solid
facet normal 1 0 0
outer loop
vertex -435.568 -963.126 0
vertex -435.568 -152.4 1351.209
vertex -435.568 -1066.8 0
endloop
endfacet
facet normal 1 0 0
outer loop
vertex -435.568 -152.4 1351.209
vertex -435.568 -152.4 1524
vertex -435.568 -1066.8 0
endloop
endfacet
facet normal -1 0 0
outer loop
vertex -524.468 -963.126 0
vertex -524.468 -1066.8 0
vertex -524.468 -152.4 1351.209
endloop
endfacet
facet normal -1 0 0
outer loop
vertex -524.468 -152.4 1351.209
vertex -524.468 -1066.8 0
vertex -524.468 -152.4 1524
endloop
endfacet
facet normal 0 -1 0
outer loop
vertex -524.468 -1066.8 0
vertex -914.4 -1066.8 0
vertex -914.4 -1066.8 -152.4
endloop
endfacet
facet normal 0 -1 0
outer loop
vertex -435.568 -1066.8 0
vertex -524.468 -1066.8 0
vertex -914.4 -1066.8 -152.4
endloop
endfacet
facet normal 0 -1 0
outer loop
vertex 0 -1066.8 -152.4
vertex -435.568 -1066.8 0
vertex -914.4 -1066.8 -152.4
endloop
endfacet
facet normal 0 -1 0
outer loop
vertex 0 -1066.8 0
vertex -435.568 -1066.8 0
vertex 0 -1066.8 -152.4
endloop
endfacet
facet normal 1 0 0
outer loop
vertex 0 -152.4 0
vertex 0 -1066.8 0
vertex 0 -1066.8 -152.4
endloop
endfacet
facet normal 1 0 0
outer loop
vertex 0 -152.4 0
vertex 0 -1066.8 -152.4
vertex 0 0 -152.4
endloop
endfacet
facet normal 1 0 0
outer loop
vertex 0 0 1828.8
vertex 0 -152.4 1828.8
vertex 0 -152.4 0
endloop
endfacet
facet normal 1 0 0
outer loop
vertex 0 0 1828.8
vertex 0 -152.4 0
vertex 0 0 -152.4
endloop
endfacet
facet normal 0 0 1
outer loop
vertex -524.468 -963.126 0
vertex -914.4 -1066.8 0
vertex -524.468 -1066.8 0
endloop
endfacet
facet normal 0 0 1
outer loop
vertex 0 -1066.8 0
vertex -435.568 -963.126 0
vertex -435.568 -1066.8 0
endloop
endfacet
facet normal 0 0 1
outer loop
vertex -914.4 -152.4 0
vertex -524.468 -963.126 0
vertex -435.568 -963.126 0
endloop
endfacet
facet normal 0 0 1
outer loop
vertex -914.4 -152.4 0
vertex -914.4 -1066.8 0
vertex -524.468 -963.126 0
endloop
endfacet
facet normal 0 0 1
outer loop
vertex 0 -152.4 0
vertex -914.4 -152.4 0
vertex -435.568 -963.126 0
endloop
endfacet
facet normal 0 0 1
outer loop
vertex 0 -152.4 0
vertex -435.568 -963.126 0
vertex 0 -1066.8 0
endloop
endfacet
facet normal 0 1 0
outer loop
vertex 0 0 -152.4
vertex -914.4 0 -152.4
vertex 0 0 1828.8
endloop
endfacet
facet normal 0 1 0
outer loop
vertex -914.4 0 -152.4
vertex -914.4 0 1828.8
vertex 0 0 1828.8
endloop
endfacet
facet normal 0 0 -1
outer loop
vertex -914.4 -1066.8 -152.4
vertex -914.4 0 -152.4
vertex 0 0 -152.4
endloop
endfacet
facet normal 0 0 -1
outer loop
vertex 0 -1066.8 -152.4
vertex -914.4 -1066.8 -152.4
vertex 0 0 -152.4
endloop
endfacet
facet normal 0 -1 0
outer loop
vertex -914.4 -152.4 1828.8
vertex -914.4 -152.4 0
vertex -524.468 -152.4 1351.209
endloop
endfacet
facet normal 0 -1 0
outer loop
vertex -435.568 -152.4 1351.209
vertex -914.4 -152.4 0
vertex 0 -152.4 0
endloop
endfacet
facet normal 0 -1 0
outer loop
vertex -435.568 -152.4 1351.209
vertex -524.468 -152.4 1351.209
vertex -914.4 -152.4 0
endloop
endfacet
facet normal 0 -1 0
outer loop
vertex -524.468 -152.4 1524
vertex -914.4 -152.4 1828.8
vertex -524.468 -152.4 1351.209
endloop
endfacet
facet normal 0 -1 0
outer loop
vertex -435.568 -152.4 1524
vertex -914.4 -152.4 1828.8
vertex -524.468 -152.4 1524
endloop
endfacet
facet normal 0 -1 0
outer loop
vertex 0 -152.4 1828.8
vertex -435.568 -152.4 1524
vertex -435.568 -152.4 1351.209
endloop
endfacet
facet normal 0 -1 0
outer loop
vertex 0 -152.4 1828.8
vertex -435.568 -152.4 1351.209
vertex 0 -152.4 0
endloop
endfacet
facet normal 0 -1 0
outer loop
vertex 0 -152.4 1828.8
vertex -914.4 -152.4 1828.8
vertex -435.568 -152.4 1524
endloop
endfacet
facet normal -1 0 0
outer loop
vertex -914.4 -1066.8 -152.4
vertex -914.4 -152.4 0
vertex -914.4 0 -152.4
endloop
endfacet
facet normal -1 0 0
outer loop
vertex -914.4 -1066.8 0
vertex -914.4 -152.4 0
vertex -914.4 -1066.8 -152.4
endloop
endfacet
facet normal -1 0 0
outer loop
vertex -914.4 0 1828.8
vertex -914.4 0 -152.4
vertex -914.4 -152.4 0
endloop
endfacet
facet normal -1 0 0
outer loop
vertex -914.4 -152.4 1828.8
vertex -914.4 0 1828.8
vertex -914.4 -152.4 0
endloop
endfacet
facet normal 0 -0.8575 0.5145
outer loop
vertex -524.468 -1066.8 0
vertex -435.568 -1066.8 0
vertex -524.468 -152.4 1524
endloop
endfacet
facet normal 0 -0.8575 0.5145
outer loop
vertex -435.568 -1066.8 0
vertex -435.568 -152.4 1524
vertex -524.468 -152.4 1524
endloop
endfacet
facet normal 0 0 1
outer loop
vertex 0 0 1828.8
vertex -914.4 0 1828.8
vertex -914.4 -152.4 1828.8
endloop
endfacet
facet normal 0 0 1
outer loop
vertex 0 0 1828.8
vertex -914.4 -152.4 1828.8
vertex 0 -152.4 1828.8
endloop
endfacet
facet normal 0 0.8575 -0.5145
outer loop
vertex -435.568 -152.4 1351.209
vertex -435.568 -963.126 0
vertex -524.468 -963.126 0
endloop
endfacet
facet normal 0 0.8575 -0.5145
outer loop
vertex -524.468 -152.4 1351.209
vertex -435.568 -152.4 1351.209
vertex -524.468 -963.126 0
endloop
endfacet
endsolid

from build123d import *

# Parameters (mm, degrees)
F0_W     = 914.4
F0_H     = 1828.8
F1_DEPTH = 152.4
F2_W     = 914.4
F2_H     = 152.4
F2_H_2   = 914.4
F3_DEPTH = 152.4
F7_W     = 88.9
F7_H     = 1306.8192187859
F8_DEPTH = 88.9


with BuildPart() as f1:
    # F0 (on Front) → F1 (new body)
    with BuildSketch(Plane.XZ):
        with Locations((-457.2, 914.4)):
            Rectangle(F0_W, F0_H)
    extrude(amount=F1_DEPTH)

    # F2 (on Top) → F3 (join)
    with BuildSketch(Plane.XY):
        with Locations((-457.2, -76.2)):
            Rectangle(F2_W, F2_H)
        with Locations((-457.2, -609.6)):
            Rectangle(F2_W, F2_H_2)
    extrude(amount=-F3_DEPTH)

    # F7 (on 3pt) → F8 (join)
    with BuildSketch(Plane(origin=(0, -784.4117647059, 470.6470588235), x_dir=(-1, 0, 0), z_dir=(0, 0.8574929257, -0.5144957554))):
        Polygon((435.5678258105, -548.8640718901), (524.4678258105, -548.8640718901), (524.4678258105, -503.1253992326), (524.4678258105, -78.4091531272), (435.5678258105, -78.4091531272), (435.5678258105, -503.1253992326), align=None)
        with Locations((480.0178258105, 575.0004562658)):
            Rectangle(F7_W, F7_H)
    extrude(amount=F8_DEPTH)


solid = f1.part
